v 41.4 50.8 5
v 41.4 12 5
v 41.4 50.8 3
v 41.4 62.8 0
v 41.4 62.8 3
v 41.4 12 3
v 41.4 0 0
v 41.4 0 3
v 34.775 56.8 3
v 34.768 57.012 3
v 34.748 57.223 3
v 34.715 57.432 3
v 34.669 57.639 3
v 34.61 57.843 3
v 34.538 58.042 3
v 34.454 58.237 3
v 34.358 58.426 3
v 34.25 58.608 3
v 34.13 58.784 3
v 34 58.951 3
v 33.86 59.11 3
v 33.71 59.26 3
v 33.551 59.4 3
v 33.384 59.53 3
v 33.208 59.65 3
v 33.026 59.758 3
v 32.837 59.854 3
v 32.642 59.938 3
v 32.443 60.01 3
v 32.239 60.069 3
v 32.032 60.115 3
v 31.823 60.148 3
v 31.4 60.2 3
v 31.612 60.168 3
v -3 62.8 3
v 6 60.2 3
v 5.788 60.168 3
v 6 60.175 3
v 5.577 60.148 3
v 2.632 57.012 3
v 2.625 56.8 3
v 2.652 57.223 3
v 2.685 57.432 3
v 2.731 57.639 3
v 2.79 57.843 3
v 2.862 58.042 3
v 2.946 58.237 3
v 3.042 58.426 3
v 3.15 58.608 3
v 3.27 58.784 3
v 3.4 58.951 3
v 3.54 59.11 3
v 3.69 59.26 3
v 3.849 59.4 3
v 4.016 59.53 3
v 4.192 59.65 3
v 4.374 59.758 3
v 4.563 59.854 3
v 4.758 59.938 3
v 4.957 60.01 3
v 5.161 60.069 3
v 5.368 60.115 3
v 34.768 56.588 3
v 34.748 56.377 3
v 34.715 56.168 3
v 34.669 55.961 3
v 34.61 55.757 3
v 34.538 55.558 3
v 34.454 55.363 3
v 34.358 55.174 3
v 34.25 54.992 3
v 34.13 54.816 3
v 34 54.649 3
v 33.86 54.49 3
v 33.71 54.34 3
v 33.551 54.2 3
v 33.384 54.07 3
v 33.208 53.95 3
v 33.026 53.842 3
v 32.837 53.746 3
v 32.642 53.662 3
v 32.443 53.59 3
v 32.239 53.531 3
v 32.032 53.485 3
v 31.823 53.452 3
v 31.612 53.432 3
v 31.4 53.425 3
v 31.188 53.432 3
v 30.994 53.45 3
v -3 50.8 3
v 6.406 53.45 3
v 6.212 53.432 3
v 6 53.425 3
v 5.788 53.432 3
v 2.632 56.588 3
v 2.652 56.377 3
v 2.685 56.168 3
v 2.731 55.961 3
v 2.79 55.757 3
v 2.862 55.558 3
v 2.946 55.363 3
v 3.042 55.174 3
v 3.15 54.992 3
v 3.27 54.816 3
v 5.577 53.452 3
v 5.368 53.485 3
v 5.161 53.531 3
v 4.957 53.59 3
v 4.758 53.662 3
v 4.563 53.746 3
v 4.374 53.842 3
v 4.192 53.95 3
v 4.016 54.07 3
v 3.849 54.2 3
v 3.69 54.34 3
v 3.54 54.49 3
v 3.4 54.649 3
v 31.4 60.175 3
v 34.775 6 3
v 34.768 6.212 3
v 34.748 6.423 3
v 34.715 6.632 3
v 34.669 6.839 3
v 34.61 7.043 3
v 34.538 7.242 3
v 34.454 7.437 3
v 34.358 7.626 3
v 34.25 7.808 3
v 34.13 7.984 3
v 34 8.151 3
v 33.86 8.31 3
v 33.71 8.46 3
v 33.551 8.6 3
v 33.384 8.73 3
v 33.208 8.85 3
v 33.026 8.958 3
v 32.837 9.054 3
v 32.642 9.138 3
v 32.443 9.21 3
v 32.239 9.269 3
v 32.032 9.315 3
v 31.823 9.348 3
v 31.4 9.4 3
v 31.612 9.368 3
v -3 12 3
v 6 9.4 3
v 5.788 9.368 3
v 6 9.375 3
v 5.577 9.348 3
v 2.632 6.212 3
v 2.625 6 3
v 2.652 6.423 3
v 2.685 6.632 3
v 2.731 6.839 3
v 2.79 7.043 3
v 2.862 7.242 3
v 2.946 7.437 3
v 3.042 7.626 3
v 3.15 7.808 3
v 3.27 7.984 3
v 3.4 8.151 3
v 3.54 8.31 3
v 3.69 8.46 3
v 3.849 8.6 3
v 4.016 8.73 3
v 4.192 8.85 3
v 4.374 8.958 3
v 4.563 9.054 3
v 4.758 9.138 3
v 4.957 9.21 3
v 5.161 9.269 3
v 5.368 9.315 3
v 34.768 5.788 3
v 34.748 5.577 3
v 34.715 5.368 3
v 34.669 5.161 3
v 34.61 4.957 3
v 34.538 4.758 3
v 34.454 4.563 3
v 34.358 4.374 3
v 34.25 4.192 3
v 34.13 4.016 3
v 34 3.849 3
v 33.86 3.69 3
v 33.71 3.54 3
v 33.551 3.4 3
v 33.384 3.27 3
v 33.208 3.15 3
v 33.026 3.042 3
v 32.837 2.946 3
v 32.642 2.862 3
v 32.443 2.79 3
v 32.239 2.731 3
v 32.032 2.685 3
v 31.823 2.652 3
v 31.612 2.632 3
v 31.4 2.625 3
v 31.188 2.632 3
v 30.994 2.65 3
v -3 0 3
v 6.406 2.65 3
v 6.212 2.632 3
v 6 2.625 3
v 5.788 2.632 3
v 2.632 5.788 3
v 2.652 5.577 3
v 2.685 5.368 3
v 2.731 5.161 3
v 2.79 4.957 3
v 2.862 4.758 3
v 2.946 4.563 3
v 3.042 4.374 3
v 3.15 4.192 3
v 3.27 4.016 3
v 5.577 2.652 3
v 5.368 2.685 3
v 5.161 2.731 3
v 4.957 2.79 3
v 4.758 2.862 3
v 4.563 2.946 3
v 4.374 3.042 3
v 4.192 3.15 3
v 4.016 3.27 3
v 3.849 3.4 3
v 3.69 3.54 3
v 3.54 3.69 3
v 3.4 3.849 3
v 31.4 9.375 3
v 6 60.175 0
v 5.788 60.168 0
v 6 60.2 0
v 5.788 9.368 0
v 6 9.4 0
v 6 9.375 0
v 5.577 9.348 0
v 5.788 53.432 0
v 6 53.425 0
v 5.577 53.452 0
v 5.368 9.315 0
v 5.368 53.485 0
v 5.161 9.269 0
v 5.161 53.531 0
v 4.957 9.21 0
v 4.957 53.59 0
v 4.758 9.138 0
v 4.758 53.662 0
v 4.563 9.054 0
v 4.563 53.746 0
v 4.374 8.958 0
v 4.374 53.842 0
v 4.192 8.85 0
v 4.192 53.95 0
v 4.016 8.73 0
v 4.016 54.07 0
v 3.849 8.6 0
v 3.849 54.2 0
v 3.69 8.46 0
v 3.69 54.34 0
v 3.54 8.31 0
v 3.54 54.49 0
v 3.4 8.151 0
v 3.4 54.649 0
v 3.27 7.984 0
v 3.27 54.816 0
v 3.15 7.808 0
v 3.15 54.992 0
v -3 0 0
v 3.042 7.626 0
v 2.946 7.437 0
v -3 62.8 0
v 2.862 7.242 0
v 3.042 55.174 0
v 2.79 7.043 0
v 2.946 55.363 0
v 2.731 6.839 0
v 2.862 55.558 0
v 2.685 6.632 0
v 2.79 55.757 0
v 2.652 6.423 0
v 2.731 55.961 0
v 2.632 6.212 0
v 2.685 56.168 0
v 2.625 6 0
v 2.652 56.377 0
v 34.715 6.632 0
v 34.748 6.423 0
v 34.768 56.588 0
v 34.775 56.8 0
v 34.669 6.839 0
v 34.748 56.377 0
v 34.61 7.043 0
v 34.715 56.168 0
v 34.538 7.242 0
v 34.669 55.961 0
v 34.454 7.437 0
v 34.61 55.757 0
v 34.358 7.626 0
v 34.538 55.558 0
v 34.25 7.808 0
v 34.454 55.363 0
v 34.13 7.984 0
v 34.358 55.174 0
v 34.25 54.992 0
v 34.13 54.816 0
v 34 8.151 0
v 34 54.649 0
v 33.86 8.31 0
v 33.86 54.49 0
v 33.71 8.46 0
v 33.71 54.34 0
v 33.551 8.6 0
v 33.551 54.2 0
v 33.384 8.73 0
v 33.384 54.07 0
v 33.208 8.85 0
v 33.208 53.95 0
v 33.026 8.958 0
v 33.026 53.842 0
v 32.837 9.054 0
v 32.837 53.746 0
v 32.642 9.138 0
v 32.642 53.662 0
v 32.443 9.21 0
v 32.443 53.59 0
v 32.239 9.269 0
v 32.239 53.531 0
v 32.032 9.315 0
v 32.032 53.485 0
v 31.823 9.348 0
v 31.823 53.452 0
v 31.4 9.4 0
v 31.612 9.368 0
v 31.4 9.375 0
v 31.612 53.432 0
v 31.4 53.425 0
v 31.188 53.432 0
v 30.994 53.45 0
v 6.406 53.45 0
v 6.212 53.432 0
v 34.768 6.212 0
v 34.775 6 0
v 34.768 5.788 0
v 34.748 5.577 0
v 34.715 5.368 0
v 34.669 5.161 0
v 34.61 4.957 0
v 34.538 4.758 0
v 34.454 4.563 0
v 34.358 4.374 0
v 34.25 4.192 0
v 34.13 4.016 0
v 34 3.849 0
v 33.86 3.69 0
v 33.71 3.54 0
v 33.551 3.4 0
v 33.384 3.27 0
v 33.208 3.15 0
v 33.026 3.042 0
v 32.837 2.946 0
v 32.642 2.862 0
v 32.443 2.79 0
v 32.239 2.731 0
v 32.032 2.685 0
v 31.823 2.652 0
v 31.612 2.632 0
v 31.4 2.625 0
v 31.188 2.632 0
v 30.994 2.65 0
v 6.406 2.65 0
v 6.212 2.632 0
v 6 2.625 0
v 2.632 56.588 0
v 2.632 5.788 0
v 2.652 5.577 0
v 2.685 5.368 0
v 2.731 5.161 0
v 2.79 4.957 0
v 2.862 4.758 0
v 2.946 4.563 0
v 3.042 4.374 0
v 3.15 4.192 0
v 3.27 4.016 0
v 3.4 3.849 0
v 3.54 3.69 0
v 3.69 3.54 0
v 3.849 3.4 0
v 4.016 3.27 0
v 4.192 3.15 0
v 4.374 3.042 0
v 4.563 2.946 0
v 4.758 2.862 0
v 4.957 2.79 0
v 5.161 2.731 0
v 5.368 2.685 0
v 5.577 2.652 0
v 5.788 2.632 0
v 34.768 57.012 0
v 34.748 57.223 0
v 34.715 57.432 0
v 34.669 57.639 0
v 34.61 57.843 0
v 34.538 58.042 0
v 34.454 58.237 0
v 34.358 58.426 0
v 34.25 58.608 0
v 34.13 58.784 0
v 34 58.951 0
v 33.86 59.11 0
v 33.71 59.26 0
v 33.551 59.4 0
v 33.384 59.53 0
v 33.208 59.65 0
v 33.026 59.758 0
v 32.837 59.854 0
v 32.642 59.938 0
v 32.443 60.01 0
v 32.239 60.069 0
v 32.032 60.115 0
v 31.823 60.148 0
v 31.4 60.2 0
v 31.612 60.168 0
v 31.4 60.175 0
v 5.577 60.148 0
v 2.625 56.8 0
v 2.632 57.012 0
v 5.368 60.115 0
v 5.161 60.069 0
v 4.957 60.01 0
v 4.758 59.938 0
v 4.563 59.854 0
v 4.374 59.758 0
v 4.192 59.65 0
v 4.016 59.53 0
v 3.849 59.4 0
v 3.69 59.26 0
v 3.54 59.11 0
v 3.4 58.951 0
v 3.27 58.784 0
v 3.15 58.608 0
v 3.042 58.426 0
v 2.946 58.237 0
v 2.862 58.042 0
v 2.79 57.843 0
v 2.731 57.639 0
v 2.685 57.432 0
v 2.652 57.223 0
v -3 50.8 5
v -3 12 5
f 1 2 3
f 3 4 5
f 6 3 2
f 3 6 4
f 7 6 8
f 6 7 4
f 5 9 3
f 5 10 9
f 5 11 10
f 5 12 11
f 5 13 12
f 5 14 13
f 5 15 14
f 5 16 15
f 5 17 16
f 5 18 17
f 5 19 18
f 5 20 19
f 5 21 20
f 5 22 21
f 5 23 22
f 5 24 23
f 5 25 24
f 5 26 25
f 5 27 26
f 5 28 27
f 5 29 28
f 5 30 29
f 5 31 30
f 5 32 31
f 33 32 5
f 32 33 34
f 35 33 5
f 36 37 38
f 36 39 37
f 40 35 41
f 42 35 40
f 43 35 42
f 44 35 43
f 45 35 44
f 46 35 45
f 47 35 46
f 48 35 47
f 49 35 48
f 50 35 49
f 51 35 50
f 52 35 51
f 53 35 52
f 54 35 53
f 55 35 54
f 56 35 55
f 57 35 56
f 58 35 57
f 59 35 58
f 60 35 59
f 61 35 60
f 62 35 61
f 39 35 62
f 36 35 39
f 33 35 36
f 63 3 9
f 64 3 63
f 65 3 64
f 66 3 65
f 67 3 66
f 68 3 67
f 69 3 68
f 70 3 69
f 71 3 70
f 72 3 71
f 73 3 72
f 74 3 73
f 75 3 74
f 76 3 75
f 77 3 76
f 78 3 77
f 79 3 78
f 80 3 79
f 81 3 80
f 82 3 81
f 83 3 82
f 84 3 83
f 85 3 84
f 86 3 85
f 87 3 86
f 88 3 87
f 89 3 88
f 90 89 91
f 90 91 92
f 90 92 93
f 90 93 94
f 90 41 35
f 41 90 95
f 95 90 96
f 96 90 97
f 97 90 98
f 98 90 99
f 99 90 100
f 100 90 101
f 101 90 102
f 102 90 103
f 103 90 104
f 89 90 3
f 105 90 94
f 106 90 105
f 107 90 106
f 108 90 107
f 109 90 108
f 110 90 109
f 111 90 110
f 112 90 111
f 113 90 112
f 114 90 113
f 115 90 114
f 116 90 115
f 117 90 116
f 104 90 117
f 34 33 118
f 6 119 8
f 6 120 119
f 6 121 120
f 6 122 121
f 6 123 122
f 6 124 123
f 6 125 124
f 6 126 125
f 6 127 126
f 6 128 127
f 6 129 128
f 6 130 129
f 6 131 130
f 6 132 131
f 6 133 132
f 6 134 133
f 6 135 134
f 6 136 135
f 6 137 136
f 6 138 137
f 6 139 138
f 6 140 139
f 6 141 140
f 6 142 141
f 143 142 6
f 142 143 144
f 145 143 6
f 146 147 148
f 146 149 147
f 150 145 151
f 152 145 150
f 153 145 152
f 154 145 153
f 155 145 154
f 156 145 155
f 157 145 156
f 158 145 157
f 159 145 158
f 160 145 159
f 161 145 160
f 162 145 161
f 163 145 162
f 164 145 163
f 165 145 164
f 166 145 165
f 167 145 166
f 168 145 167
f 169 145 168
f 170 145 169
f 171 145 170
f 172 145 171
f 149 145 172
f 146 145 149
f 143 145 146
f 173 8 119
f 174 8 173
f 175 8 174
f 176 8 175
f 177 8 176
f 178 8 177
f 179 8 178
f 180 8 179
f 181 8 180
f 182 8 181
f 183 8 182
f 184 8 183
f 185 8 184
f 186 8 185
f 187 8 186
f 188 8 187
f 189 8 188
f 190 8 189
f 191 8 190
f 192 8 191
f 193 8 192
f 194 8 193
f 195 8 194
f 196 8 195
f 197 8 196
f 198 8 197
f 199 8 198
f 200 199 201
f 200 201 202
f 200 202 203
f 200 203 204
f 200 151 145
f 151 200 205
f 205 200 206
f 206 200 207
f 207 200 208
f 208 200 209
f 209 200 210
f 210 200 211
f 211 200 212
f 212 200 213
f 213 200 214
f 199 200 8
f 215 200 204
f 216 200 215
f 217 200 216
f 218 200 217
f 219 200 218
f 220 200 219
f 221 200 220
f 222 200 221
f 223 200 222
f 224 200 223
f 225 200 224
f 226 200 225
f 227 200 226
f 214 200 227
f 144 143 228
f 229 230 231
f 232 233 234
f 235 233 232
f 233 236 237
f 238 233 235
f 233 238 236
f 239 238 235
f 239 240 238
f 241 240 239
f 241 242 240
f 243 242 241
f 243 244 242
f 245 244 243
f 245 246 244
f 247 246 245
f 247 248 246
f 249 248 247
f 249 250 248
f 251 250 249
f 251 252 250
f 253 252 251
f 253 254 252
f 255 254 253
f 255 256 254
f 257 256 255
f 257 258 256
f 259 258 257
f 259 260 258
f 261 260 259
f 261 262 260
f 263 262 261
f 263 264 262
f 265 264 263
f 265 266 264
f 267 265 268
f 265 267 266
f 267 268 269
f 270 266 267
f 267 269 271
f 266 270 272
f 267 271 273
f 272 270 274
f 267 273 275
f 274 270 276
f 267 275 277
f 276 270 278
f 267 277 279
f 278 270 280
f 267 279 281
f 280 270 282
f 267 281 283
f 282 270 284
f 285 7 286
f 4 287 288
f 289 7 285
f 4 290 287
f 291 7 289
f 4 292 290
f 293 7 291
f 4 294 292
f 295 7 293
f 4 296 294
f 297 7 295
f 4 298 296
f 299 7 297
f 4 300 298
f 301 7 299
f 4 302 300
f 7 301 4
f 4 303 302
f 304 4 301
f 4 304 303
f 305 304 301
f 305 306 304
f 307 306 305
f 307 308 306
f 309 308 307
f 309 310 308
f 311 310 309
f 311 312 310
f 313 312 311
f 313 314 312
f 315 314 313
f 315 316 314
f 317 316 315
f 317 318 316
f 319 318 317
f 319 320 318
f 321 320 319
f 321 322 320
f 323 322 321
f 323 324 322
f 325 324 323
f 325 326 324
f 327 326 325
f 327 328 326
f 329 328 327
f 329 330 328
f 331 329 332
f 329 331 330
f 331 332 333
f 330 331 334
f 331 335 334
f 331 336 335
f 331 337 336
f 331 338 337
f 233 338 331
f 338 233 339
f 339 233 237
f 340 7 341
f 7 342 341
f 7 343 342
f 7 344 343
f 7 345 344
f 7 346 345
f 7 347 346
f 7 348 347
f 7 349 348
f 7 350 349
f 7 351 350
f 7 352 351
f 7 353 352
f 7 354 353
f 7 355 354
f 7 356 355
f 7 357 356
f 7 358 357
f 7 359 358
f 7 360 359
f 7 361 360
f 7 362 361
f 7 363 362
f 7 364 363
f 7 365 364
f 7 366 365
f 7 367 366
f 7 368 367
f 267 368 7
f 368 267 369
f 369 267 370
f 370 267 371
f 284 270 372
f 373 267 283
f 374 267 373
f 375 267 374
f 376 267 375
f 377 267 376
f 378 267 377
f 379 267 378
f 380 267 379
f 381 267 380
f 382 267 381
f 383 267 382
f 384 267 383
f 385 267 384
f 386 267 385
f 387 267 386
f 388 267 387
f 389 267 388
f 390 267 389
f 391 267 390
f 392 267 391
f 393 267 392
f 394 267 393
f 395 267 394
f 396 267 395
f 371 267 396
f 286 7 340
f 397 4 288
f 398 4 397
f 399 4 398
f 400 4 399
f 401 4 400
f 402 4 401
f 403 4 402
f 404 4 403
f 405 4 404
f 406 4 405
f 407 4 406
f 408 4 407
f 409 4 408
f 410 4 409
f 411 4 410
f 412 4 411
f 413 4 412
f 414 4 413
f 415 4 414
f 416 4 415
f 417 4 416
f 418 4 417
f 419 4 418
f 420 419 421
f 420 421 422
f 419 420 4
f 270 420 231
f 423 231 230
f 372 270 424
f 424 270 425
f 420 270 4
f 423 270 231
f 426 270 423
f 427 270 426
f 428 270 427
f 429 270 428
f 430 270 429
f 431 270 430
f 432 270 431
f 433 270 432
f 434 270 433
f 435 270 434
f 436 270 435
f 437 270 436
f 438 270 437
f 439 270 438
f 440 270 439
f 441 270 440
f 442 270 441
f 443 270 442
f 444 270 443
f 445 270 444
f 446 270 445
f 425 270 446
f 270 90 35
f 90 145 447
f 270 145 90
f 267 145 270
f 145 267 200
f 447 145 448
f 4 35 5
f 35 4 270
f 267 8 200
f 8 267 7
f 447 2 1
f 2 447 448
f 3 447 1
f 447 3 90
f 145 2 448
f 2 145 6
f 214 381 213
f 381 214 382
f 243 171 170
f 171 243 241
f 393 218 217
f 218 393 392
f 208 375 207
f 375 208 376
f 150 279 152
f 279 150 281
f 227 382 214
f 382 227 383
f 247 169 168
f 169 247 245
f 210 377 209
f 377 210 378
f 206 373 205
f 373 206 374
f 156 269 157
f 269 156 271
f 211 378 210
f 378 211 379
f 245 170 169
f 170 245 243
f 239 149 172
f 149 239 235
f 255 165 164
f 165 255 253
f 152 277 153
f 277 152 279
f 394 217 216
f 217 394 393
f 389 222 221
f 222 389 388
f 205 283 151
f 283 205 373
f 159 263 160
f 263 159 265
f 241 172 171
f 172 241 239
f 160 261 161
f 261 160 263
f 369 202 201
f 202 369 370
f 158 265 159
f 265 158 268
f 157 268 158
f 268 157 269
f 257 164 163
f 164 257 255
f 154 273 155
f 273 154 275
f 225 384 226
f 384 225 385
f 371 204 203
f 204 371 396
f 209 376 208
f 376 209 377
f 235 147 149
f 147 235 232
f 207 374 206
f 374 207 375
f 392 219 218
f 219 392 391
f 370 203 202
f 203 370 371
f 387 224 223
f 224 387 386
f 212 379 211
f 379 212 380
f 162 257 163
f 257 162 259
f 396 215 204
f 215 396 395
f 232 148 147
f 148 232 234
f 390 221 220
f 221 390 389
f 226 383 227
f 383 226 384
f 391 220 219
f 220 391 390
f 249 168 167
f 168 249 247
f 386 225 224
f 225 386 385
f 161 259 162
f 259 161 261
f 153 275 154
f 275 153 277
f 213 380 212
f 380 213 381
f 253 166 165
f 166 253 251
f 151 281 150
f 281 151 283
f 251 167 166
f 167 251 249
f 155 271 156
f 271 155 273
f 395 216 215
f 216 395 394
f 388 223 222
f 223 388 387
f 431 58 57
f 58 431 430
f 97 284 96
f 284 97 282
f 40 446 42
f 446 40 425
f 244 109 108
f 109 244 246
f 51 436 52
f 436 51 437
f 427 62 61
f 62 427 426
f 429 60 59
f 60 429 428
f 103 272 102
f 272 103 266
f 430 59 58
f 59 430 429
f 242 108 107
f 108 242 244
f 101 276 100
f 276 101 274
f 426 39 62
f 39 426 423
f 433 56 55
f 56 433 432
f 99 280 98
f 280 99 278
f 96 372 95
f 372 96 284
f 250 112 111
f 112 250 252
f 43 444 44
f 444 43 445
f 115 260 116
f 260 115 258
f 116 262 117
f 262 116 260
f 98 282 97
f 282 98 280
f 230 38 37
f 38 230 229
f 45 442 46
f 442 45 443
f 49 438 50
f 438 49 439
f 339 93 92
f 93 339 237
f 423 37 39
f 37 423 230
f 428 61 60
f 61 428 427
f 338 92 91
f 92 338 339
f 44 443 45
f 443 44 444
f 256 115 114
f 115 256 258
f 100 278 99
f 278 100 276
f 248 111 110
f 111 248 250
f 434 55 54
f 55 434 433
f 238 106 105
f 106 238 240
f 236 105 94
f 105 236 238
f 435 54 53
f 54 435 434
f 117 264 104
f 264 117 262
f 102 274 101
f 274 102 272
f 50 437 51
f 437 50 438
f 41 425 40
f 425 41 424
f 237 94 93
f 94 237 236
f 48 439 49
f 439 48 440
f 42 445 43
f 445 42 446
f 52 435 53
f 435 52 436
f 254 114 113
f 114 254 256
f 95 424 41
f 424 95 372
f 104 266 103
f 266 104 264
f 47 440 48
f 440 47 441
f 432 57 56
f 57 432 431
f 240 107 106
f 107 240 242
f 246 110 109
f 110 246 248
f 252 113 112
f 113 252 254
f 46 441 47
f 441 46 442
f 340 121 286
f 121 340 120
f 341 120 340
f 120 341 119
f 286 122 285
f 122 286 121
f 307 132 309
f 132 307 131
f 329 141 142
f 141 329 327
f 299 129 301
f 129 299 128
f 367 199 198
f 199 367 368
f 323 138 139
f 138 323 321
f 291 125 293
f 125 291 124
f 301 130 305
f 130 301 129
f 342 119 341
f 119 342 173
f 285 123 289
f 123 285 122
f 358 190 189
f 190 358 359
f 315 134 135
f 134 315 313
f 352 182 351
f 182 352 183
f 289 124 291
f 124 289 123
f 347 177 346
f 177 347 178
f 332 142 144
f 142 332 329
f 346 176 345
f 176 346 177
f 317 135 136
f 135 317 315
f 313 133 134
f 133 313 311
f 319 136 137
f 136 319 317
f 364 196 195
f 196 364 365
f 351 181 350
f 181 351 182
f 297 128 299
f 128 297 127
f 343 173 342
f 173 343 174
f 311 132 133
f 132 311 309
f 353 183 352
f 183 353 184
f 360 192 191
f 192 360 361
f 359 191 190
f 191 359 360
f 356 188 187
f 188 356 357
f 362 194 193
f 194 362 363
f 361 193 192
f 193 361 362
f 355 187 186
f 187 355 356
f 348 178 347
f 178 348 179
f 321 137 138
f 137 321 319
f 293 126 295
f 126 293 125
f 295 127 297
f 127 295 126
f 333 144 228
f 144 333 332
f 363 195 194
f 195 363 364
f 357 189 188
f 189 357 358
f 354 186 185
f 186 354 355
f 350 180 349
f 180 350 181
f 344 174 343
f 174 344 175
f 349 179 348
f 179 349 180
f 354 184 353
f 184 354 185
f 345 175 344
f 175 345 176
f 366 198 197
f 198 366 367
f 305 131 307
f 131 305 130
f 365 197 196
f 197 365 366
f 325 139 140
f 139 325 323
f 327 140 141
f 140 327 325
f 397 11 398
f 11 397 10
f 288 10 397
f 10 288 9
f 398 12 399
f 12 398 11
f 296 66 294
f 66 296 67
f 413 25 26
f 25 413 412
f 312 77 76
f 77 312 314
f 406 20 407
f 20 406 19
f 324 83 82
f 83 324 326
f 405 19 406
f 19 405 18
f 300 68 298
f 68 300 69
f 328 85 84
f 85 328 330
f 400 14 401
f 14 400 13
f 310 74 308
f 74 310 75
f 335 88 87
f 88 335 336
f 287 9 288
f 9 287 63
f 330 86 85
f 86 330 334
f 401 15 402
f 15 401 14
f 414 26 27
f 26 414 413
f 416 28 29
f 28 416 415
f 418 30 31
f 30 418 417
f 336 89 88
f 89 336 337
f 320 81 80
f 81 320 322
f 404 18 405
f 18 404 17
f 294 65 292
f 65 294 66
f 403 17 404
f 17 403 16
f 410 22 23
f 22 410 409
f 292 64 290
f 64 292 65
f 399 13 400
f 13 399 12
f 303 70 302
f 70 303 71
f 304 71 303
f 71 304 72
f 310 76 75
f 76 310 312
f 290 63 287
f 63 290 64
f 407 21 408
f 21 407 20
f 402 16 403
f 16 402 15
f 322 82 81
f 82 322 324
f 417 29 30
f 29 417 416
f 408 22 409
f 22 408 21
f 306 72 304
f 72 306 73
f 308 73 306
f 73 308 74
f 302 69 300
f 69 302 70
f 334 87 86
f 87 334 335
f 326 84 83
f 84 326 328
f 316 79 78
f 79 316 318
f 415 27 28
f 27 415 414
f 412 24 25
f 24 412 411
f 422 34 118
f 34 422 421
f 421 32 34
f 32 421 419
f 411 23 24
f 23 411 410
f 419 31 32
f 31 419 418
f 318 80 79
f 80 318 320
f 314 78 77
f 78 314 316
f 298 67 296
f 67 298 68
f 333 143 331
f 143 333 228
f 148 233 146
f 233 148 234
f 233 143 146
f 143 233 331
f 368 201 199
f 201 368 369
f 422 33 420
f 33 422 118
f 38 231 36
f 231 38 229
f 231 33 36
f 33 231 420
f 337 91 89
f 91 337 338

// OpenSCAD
$fn = 100;

module platform () {
    translate([-3,0,0]){
        cube([19+25.4,62.8,3]);
    }
    translate([-3,12,2]){
        cube([19+25.4,62.8-24,3]);
    }
}

module holes() {
    translate([6,6,-0.5]) {
        cylinder(d=6.75,h=4);}
    translate([6,50.8+6,-0.5]) {
        cylinder(d=6.75,h=4);}
    translate([6+25.4,6,-0.5]) {
        cylinder(d=6.75,h=4);}
    translate([6+25.4,50.8+6,-0.5]) {
        cylinder(d=6.75,h=4);}
    translate([6,2.65,-0.5]) {
            cube([25.4,6.75,4]); }
    translate([6,2.65+50.8,-0.5]) {
            cube([25.4,6.75,4]); }
    }

difference() {
    platform();
    #holes();
}
